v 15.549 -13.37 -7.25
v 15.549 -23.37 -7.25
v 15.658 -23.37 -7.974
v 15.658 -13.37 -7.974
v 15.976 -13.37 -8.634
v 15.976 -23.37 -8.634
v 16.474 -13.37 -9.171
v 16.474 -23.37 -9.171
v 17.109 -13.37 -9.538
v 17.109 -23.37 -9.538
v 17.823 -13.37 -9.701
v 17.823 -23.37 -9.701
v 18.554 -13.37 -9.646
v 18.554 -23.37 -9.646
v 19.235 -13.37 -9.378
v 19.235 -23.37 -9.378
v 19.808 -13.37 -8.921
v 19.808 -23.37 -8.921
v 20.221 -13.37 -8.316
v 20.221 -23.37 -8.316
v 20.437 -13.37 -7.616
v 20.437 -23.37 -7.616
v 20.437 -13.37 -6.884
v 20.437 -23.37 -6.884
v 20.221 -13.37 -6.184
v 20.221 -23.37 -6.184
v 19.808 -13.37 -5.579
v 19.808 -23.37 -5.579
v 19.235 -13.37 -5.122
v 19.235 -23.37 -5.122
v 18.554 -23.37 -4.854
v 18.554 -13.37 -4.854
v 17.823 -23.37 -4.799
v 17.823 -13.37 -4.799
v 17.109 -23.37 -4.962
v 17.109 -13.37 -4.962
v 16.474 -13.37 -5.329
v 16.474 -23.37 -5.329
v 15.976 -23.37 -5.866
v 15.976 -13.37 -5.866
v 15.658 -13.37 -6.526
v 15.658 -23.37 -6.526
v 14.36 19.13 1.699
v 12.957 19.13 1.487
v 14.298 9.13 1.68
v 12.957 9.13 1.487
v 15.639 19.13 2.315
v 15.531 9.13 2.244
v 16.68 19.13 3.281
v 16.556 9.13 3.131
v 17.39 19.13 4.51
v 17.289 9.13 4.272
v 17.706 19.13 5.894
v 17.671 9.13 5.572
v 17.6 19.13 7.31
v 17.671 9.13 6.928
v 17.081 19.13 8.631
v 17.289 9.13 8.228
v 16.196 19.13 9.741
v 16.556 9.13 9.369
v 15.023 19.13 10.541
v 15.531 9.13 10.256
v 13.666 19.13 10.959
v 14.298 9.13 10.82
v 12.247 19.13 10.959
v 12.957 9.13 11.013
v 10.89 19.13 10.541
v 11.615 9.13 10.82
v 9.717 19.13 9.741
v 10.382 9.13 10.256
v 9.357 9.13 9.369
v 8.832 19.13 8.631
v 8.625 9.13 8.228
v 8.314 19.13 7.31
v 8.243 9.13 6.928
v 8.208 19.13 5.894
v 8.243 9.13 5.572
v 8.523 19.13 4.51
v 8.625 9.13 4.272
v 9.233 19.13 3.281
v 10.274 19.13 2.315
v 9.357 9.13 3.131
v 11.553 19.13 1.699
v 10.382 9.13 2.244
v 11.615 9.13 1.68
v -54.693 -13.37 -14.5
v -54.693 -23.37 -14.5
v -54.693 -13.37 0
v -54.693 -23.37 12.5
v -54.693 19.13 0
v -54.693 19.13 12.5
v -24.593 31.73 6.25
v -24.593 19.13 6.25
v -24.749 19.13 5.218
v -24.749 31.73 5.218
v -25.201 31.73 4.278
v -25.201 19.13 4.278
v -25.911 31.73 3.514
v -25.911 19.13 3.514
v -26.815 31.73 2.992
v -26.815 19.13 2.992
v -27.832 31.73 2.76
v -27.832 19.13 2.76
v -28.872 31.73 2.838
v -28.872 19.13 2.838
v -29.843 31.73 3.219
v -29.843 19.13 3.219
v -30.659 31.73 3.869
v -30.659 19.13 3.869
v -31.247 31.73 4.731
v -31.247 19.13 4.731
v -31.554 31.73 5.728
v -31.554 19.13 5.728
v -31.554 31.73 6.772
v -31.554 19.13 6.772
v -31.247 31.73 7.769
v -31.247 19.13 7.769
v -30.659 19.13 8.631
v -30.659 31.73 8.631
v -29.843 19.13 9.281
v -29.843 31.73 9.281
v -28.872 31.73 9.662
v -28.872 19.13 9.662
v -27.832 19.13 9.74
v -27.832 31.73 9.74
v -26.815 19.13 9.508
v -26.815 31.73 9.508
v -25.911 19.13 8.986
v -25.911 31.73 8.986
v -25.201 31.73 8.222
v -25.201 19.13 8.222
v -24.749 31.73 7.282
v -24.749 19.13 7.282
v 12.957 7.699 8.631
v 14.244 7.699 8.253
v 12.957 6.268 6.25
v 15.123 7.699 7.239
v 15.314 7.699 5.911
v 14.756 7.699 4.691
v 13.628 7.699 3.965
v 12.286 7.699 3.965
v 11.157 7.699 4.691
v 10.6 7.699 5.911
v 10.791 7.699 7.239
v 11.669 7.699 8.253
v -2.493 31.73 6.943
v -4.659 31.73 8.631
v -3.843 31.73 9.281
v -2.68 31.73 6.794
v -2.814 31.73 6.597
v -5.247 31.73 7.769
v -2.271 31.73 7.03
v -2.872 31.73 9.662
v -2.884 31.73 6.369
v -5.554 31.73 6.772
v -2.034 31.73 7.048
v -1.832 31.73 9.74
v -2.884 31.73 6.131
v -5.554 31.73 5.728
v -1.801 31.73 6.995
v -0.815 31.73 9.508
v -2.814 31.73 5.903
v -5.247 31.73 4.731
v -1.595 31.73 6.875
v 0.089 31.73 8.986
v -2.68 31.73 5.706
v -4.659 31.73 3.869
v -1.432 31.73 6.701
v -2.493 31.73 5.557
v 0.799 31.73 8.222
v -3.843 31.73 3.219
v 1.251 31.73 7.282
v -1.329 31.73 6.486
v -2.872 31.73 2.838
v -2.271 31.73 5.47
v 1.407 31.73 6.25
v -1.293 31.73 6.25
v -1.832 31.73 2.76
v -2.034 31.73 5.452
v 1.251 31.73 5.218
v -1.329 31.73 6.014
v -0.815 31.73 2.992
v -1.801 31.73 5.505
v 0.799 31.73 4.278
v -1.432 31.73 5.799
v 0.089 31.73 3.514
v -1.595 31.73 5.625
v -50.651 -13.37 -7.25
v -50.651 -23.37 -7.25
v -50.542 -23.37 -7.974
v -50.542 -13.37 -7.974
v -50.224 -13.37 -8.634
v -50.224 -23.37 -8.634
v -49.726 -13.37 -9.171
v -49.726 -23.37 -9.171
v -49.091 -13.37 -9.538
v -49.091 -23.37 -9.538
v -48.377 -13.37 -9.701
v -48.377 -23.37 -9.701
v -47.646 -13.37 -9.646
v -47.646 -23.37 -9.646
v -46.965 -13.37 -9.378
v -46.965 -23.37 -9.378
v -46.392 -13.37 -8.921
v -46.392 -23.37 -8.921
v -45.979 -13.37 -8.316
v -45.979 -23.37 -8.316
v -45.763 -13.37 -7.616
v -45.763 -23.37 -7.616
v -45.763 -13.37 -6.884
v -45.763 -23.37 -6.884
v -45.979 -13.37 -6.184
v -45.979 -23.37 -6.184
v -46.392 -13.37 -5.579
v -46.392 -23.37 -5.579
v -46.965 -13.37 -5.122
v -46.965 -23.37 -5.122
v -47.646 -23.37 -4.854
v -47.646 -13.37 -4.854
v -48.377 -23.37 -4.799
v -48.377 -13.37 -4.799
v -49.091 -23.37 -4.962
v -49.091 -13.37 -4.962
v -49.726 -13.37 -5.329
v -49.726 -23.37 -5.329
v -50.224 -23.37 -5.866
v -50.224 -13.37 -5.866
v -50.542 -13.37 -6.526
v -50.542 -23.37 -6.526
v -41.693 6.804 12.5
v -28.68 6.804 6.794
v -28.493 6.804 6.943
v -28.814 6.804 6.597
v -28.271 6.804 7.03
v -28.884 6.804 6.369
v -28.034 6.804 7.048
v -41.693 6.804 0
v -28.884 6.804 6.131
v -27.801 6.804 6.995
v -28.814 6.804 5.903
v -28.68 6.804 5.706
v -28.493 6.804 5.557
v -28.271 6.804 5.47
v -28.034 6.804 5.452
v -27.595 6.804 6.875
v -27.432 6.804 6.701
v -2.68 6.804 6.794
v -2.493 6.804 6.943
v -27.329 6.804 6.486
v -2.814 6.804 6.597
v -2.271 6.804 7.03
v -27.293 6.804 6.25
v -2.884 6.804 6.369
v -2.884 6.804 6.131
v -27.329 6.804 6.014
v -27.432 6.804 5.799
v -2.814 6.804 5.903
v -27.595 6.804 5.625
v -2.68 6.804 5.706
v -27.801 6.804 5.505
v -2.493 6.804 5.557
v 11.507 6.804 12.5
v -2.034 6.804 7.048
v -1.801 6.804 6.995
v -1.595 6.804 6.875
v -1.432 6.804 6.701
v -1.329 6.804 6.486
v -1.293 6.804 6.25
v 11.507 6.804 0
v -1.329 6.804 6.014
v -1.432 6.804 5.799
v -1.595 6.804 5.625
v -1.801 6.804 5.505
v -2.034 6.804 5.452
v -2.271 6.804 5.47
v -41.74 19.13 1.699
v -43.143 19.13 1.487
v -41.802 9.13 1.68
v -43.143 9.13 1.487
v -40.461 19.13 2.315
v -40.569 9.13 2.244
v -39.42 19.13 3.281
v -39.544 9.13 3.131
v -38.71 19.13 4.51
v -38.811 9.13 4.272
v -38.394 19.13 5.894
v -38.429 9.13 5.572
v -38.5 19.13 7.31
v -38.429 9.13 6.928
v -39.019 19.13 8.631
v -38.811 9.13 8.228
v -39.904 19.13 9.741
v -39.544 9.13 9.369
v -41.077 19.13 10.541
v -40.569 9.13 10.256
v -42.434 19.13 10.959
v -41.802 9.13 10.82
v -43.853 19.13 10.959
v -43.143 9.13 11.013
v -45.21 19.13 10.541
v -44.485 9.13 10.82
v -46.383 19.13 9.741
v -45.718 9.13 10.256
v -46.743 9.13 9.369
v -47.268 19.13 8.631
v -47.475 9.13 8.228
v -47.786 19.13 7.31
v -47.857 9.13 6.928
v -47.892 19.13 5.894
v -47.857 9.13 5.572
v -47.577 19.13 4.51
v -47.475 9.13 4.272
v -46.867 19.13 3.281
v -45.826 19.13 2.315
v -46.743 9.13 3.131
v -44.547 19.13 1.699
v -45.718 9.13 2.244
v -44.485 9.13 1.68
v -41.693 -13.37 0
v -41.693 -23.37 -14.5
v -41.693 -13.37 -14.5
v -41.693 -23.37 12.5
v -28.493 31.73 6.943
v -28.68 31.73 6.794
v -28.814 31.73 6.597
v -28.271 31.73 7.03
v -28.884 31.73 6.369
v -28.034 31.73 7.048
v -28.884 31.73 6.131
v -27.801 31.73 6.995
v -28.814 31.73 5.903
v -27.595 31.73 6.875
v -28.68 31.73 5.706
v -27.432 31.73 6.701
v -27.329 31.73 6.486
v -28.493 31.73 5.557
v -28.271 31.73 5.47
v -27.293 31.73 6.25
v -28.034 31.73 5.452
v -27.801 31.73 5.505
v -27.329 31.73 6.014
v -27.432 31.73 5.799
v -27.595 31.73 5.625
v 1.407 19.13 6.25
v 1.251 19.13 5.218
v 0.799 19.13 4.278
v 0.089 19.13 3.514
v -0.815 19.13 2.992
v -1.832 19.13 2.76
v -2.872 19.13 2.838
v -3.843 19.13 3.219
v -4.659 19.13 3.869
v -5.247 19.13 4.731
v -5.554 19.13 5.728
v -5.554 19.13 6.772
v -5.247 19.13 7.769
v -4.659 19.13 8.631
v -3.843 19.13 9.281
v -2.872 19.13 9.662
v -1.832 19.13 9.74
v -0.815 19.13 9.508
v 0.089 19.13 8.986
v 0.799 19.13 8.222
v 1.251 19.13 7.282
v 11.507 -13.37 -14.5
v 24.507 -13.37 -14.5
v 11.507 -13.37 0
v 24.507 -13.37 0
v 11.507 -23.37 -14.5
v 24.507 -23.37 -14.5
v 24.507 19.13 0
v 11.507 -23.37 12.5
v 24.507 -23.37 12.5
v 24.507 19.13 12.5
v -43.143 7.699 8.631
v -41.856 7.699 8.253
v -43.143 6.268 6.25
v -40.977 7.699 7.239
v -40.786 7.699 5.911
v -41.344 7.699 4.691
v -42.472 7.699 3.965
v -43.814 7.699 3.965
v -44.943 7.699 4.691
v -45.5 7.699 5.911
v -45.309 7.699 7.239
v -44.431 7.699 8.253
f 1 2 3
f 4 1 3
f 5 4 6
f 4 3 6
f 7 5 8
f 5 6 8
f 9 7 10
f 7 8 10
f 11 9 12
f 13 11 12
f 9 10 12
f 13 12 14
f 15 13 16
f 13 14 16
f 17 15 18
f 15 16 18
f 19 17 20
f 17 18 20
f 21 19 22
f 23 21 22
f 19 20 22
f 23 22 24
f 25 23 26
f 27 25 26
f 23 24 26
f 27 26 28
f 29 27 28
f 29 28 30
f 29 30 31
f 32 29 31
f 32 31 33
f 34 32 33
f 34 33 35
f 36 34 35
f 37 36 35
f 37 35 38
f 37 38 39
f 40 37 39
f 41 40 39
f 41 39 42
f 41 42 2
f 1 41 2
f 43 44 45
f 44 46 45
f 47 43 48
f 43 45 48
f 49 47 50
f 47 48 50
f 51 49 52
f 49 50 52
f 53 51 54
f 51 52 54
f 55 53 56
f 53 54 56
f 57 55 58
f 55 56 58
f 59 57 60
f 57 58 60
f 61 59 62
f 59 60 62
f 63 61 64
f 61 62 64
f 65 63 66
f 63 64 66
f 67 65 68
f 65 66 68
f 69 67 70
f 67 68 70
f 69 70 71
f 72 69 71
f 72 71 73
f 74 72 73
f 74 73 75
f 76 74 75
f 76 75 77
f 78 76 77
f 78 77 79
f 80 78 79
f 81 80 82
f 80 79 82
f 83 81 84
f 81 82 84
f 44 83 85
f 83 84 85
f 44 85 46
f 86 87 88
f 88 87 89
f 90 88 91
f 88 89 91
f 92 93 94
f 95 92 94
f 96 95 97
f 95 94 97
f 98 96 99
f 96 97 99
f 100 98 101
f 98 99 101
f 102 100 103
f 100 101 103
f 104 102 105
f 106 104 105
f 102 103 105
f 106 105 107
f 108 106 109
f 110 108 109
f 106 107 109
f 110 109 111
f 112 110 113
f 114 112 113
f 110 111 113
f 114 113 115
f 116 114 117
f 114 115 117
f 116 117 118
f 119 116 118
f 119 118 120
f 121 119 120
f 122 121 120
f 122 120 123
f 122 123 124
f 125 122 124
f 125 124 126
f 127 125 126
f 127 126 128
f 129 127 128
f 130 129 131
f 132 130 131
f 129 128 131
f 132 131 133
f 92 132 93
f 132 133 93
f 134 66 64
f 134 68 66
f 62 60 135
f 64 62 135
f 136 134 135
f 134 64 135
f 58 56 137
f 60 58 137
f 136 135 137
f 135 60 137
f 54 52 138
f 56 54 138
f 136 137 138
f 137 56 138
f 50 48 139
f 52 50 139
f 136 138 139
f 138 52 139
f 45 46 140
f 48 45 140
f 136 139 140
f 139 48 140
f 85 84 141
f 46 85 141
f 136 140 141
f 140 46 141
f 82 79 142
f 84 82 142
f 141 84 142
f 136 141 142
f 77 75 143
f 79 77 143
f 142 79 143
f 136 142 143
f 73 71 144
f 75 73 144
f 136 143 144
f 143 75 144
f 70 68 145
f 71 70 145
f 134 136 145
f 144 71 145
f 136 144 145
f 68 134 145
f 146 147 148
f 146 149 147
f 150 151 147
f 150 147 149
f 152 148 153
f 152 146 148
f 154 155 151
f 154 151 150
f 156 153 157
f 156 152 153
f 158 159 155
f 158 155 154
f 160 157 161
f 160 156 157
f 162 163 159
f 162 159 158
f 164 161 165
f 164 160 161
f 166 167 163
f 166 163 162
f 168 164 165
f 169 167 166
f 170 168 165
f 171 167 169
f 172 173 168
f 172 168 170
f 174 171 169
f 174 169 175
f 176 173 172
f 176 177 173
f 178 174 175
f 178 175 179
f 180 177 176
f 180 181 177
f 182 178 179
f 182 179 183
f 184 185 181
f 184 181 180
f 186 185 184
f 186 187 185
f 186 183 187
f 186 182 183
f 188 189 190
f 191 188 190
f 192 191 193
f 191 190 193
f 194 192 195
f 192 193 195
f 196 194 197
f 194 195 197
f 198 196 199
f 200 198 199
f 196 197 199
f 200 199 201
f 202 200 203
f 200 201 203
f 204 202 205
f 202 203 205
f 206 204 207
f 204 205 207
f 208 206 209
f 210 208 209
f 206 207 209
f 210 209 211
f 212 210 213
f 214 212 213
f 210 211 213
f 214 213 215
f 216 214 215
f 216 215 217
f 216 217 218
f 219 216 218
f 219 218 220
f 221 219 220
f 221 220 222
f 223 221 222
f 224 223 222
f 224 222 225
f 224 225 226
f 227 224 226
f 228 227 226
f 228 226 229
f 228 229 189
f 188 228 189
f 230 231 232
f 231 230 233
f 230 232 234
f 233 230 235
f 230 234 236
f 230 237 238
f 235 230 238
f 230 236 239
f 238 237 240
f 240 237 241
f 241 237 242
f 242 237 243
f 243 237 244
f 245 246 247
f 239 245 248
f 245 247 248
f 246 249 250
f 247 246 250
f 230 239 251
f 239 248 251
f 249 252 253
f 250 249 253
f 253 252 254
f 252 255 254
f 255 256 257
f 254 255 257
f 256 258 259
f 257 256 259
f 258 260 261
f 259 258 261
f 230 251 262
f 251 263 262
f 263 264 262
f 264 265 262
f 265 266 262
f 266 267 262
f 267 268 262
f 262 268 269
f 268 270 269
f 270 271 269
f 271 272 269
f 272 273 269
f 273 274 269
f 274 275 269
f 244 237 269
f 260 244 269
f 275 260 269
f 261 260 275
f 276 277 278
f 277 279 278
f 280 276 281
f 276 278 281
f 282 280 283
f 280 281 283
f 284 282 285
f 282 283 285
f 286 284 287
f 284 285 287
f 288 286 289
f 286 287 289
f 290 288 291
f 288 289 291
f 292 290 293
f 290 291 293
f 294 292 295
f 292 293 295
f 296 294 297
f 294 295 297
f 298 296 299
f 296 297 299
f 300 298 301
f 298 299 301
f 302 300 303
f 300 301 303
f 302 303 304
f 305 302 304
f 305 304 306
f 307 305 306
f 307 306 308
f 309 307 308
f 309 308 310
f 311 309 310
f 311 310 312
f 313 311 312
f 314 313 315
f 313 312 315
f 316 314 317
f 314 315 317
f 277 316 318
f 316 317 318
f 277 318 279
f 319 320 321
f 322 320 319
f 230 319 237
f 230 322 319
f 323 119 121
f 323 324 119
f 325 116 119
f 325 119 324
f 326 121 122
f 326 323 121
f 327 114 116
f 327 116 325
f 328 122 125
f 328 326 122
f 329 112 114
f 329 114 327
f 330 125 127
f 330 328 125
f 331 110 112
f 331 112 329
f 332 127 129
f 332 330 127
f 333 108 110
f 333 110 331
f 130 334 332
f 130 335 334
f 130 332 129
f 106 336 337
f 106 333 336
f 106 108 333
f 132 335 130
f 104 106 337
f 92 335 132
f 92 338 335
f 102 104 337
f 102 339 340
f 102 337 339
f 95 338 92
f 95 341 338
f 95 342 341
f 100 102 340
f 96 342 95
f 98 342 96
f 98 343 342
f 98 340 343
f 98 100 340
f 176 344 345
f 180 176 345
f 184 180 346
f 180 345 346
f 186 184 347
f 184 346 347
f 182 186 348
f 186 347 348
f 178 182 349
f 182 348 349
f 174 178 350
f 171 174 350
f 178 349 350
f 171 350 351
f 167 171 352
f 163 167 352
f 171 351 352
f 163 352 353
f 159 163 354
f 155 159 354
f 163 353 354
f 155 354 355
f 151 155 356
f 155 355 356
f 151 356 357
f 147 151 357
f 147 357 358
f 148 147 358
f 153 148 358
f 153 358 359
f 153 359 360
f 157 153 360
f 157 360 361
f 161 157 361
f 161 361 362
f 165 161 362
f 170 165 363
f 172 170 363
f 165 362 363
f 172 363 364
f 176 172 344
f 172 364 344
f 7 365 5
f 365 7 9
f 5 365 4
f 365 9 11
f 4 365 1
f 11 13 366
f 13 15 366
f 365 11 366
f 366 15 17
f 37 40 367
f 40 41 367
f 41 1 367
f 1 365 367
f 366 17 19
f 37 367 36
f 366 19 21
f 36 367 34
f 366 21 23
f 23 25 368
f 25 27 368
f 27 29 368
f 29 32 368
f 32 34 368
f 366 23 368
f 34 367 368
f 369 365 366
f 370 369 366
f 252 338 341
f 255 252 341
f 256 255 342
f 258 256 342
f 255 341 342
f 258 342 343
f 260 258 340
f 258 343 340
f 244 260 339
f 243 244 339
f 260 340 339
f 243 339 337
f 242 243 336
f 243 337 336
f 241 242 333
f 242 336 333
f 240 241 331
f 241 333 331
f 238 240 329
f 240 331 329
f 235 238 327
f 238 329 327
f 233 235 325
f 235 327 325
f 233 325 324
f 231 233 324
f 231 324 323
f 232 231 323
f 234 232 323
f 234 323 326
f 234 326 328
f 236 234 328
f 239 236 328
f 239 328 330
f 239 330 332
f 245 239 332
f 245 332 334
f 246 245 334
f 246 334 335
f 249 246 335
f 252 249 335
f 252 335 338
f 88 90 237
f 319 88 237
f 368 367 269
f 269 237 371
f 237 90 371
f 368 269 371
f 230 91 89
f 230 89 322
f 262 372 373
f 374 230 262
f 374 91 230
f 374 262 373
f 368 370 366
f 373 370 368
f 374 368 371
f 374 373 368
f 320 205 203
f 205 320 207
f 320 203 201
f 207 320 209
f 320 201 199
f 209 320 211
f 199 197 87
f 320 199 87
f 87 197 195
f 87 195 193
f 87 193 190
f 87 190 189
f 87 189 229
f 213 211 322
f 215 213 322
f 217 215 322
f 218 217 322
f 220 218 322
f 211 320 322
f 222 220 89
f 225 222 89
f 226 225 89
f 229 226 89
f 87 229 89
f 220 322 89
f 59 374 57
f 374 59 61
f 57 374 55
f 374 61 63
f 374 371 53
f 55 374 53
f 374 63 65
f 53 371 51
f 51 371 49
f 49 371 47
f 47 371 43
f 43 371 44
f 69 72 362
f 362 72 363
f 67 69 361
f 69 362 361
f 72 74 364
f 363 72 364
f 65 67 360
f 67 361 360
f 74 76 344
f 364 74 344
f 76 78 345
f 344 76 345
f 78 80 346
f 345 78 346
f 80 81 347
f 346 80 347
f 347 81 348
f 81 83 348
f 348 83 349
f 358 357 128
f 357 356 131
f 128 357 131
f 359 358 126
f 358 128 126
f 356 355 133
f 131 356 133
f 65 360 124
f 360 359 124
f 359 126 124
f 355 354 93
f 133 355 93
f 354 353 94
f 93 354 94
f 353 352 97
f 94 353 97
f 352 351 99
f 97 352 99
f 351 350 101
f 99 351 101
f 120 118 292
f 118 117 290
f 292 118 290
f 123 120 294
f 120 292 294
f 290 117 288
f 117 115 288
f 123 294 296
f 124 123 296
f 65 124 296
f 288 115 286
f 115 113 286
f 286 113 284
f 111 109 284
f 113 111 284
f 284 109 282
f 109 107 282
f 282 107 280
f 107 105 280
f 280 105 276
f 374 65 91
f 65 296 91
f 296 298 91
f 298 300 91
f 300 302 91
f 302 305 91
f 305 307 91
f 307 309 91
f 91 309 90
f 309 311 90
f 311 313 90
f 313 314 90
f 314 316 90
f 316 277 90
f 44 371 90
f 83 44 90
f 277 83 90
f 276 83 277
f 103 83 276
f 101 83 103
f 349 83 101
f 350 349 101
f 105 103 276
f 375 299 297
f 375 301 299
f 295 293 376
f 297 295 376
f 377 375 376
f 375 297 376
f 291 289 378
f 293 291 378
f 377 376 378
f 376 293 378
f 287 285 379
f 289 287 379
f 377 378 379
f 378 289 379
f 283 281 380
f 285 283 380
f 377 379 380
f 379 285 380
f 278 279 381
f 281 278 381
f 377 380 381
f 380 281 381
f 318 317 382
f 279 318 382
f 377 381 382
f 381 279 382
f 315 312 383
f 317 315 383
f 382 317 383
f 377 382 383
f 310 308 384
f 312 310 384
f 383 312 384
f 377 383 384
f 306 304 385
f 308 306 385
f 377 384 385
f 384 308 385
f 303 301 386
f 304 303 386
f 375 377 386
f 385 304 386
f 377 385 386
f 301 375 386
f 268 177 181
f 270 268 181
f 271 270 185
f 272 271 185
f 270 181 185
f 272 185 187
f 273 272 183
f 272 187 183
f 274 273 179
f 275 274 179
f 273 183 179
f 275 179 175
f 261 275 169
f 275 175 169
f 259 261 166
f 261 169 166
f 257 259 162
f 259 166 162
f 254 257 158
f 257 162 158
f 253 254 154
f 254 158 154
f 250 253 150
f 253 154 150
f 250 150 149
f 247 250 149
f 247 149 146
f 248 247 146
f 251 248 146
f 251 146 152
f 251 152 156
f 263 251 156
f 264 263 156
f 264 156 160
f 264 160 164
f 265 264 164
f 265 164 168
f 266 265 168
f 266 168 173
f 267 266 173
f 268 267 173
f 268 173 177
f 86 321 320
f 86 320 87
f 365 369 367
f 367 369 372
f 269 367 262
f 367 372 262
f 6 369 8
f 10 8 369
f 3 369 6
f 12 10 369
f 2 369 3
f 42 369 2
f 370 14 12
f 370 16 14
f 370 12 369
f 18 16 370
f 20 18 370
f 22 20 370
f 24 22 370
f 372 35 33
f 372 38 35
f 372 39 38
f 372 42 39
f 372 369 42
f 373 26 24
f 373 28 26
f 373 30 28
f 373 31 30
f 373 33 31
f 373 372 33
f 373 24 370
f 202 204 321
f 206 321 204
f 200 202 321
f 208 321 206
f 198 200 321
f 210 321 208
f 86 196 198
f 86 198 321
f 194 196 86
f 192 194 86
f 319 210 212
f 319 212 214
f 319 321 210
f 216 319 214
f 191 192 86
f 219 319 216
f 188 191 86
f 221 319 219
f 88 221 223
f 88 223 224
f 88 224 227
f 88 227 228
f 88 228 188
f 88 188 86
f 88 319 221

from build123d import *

# Parameters (mm, degrees)
BOSS_EXTRUDE1_DEPTH              = 12.5
SKETCH8_W                        = 13
SKETCH8_H                        = 10
BOSS_EXTRUDE2_DEPTH              = 14.5
F_10_0_1935_DIAMETER_HOLE1_D     = 4.9149
SKETCH14_R                       = 3.5
BOSS_EXTRUDE3_DEPTH              = 12.6
SKETCH23_R                       = 0.8
CUT_EXTRUDE3_DEPTH               = 30
SKETCH24_R                       = 0.8
CUT_EXTRUDE4_DEPTH               = 30
F_3_8_0_375_DIAMETER_HOLE5_D     = 9.525
F_3_8_0_375_DIAMETER_HOLE5_DEPTH = 10
F_3_8_0_375_DIAMETER_HOLE5_TIP   = 2.861598698


with BuildPart() as part:
    # Sketch6 → Boss-Extrude1 (new body)
    with BuildSketch(Plane.XY):
        Polygon((-54.693316182, -23.370226934), (-54.693316182, 19.129773066), (-15.093316182, 19.129773066), (-15.093316182, 6.803860506), (-41.693316182, 6.803860506), (-41.693316182, -23.370226934), align=None)
    extrude(amount=BOSS_EXTRUDE1_DEPTH)

    # Sketch8 → Boss-Extrude2 (add)
    with BuildSketch(Plane(origin=(0, 0, 0), x_dir=(-1, 0, 0), z_dir=(0, 0, -1))):
        with Locations((48.193316182, -18.370226934)):
            Rectangle(SKETCH8_W, SKETCH8_H)
    extrude(amount=BOSS_EXTRUDE2_DEPTH)

    # Mirror1: part across plane


with BuildPart() as part_1:
    add(part.part)
    add(part.part.mirror(Plane(origin=(-15.093316182, 6.803860506, 12.5), x_dir=(0, 0, 1), z_dir=(-1, 0, 0))))

    # #10 (0.1935) Diameter Hole1 (through all)
    with Locations(Plane(origin=(0, -13.370226934, 0), x_dir=(1, 0, 0), z_dir=(0, 1, 0))):
        with Locations((-48.193316182, 7.25), (18.006683818, 7.25)):
            Hole(F_10_0_1935_DIAMETER_HOLE1_D / 2)

    # Sketch14 → Boss-Extrude3 (add)
    with BuildSketch(Plane(origin=(0, 19.129773066, 0), x_dir=(1, 0, 0), z_dir=(0, 1, 0))):
        with Locations((-28.093316182, -6.25)):
            Circle(SKETCH14_R)
        with Locations((-2.093316182, -6.25)):
            Circle(SKETCH14_R)
    extrude(amount=BOSS_EXTRUDE3_DEPTH)

    # Sketch23 → Cut-Extrude3 (cut)
    with BuildSketch(Plane(origin=(0, 31.729773066, 0), x_dir=(1, 0, 0), z_dir=(0, 1, 0))):
        with Locations((-2.093316182, -6.25)):
            Circle(SKETCH23_R)
    extrude(amount=-CUT_EXTRUDE3_DEPTH, mode=Mode.SUBTRACT)

    # Sketch24 → Cut-Extrude4 (cut)
    with BuildSketch(Plane(origin=(0, 31.729773066, 0), x_dir=(1, 0, 0), z_dir=(0, 1, 0))):
        with Locations((-28.093316182, -6.25)):
            Circle(SKETCH24_R)
    extrude(amount=-CUT_EXTRUDE4_DEPTH, mode=Mode.SUBTRACT)

    # 3/8 (0.375) Diameter Hole5
    with Locations(Plane(origin=(-43.143316182, 19.129773066, 6.25), x_dir=(0, 0, 1), z_dir=(0, 1, 0))):
        with Locations((0, 0), (0, 56.1)):
            Hole(F_3_8_0_375_DIAMETER_HOLE5_D / 2, depth=F_3_8_0_375_DIAMETER_HOLE5_DEPTH)
            with Locations((0, 0, -(F_3_8_0_375_DIAMETER_HOLE5_DEPTH + F_3_8_0_375_DIAMETER_HOLE5_TIP / 2))):  # 118° drill point
                Cone(0, F_3_8_0_375_DIAMETER_HOLE5_D / 2, F_3_8_0_375_DIAMETER_HOLE5_TIP, mode=Mode.SUBTRACT)


solid = part_1.part
